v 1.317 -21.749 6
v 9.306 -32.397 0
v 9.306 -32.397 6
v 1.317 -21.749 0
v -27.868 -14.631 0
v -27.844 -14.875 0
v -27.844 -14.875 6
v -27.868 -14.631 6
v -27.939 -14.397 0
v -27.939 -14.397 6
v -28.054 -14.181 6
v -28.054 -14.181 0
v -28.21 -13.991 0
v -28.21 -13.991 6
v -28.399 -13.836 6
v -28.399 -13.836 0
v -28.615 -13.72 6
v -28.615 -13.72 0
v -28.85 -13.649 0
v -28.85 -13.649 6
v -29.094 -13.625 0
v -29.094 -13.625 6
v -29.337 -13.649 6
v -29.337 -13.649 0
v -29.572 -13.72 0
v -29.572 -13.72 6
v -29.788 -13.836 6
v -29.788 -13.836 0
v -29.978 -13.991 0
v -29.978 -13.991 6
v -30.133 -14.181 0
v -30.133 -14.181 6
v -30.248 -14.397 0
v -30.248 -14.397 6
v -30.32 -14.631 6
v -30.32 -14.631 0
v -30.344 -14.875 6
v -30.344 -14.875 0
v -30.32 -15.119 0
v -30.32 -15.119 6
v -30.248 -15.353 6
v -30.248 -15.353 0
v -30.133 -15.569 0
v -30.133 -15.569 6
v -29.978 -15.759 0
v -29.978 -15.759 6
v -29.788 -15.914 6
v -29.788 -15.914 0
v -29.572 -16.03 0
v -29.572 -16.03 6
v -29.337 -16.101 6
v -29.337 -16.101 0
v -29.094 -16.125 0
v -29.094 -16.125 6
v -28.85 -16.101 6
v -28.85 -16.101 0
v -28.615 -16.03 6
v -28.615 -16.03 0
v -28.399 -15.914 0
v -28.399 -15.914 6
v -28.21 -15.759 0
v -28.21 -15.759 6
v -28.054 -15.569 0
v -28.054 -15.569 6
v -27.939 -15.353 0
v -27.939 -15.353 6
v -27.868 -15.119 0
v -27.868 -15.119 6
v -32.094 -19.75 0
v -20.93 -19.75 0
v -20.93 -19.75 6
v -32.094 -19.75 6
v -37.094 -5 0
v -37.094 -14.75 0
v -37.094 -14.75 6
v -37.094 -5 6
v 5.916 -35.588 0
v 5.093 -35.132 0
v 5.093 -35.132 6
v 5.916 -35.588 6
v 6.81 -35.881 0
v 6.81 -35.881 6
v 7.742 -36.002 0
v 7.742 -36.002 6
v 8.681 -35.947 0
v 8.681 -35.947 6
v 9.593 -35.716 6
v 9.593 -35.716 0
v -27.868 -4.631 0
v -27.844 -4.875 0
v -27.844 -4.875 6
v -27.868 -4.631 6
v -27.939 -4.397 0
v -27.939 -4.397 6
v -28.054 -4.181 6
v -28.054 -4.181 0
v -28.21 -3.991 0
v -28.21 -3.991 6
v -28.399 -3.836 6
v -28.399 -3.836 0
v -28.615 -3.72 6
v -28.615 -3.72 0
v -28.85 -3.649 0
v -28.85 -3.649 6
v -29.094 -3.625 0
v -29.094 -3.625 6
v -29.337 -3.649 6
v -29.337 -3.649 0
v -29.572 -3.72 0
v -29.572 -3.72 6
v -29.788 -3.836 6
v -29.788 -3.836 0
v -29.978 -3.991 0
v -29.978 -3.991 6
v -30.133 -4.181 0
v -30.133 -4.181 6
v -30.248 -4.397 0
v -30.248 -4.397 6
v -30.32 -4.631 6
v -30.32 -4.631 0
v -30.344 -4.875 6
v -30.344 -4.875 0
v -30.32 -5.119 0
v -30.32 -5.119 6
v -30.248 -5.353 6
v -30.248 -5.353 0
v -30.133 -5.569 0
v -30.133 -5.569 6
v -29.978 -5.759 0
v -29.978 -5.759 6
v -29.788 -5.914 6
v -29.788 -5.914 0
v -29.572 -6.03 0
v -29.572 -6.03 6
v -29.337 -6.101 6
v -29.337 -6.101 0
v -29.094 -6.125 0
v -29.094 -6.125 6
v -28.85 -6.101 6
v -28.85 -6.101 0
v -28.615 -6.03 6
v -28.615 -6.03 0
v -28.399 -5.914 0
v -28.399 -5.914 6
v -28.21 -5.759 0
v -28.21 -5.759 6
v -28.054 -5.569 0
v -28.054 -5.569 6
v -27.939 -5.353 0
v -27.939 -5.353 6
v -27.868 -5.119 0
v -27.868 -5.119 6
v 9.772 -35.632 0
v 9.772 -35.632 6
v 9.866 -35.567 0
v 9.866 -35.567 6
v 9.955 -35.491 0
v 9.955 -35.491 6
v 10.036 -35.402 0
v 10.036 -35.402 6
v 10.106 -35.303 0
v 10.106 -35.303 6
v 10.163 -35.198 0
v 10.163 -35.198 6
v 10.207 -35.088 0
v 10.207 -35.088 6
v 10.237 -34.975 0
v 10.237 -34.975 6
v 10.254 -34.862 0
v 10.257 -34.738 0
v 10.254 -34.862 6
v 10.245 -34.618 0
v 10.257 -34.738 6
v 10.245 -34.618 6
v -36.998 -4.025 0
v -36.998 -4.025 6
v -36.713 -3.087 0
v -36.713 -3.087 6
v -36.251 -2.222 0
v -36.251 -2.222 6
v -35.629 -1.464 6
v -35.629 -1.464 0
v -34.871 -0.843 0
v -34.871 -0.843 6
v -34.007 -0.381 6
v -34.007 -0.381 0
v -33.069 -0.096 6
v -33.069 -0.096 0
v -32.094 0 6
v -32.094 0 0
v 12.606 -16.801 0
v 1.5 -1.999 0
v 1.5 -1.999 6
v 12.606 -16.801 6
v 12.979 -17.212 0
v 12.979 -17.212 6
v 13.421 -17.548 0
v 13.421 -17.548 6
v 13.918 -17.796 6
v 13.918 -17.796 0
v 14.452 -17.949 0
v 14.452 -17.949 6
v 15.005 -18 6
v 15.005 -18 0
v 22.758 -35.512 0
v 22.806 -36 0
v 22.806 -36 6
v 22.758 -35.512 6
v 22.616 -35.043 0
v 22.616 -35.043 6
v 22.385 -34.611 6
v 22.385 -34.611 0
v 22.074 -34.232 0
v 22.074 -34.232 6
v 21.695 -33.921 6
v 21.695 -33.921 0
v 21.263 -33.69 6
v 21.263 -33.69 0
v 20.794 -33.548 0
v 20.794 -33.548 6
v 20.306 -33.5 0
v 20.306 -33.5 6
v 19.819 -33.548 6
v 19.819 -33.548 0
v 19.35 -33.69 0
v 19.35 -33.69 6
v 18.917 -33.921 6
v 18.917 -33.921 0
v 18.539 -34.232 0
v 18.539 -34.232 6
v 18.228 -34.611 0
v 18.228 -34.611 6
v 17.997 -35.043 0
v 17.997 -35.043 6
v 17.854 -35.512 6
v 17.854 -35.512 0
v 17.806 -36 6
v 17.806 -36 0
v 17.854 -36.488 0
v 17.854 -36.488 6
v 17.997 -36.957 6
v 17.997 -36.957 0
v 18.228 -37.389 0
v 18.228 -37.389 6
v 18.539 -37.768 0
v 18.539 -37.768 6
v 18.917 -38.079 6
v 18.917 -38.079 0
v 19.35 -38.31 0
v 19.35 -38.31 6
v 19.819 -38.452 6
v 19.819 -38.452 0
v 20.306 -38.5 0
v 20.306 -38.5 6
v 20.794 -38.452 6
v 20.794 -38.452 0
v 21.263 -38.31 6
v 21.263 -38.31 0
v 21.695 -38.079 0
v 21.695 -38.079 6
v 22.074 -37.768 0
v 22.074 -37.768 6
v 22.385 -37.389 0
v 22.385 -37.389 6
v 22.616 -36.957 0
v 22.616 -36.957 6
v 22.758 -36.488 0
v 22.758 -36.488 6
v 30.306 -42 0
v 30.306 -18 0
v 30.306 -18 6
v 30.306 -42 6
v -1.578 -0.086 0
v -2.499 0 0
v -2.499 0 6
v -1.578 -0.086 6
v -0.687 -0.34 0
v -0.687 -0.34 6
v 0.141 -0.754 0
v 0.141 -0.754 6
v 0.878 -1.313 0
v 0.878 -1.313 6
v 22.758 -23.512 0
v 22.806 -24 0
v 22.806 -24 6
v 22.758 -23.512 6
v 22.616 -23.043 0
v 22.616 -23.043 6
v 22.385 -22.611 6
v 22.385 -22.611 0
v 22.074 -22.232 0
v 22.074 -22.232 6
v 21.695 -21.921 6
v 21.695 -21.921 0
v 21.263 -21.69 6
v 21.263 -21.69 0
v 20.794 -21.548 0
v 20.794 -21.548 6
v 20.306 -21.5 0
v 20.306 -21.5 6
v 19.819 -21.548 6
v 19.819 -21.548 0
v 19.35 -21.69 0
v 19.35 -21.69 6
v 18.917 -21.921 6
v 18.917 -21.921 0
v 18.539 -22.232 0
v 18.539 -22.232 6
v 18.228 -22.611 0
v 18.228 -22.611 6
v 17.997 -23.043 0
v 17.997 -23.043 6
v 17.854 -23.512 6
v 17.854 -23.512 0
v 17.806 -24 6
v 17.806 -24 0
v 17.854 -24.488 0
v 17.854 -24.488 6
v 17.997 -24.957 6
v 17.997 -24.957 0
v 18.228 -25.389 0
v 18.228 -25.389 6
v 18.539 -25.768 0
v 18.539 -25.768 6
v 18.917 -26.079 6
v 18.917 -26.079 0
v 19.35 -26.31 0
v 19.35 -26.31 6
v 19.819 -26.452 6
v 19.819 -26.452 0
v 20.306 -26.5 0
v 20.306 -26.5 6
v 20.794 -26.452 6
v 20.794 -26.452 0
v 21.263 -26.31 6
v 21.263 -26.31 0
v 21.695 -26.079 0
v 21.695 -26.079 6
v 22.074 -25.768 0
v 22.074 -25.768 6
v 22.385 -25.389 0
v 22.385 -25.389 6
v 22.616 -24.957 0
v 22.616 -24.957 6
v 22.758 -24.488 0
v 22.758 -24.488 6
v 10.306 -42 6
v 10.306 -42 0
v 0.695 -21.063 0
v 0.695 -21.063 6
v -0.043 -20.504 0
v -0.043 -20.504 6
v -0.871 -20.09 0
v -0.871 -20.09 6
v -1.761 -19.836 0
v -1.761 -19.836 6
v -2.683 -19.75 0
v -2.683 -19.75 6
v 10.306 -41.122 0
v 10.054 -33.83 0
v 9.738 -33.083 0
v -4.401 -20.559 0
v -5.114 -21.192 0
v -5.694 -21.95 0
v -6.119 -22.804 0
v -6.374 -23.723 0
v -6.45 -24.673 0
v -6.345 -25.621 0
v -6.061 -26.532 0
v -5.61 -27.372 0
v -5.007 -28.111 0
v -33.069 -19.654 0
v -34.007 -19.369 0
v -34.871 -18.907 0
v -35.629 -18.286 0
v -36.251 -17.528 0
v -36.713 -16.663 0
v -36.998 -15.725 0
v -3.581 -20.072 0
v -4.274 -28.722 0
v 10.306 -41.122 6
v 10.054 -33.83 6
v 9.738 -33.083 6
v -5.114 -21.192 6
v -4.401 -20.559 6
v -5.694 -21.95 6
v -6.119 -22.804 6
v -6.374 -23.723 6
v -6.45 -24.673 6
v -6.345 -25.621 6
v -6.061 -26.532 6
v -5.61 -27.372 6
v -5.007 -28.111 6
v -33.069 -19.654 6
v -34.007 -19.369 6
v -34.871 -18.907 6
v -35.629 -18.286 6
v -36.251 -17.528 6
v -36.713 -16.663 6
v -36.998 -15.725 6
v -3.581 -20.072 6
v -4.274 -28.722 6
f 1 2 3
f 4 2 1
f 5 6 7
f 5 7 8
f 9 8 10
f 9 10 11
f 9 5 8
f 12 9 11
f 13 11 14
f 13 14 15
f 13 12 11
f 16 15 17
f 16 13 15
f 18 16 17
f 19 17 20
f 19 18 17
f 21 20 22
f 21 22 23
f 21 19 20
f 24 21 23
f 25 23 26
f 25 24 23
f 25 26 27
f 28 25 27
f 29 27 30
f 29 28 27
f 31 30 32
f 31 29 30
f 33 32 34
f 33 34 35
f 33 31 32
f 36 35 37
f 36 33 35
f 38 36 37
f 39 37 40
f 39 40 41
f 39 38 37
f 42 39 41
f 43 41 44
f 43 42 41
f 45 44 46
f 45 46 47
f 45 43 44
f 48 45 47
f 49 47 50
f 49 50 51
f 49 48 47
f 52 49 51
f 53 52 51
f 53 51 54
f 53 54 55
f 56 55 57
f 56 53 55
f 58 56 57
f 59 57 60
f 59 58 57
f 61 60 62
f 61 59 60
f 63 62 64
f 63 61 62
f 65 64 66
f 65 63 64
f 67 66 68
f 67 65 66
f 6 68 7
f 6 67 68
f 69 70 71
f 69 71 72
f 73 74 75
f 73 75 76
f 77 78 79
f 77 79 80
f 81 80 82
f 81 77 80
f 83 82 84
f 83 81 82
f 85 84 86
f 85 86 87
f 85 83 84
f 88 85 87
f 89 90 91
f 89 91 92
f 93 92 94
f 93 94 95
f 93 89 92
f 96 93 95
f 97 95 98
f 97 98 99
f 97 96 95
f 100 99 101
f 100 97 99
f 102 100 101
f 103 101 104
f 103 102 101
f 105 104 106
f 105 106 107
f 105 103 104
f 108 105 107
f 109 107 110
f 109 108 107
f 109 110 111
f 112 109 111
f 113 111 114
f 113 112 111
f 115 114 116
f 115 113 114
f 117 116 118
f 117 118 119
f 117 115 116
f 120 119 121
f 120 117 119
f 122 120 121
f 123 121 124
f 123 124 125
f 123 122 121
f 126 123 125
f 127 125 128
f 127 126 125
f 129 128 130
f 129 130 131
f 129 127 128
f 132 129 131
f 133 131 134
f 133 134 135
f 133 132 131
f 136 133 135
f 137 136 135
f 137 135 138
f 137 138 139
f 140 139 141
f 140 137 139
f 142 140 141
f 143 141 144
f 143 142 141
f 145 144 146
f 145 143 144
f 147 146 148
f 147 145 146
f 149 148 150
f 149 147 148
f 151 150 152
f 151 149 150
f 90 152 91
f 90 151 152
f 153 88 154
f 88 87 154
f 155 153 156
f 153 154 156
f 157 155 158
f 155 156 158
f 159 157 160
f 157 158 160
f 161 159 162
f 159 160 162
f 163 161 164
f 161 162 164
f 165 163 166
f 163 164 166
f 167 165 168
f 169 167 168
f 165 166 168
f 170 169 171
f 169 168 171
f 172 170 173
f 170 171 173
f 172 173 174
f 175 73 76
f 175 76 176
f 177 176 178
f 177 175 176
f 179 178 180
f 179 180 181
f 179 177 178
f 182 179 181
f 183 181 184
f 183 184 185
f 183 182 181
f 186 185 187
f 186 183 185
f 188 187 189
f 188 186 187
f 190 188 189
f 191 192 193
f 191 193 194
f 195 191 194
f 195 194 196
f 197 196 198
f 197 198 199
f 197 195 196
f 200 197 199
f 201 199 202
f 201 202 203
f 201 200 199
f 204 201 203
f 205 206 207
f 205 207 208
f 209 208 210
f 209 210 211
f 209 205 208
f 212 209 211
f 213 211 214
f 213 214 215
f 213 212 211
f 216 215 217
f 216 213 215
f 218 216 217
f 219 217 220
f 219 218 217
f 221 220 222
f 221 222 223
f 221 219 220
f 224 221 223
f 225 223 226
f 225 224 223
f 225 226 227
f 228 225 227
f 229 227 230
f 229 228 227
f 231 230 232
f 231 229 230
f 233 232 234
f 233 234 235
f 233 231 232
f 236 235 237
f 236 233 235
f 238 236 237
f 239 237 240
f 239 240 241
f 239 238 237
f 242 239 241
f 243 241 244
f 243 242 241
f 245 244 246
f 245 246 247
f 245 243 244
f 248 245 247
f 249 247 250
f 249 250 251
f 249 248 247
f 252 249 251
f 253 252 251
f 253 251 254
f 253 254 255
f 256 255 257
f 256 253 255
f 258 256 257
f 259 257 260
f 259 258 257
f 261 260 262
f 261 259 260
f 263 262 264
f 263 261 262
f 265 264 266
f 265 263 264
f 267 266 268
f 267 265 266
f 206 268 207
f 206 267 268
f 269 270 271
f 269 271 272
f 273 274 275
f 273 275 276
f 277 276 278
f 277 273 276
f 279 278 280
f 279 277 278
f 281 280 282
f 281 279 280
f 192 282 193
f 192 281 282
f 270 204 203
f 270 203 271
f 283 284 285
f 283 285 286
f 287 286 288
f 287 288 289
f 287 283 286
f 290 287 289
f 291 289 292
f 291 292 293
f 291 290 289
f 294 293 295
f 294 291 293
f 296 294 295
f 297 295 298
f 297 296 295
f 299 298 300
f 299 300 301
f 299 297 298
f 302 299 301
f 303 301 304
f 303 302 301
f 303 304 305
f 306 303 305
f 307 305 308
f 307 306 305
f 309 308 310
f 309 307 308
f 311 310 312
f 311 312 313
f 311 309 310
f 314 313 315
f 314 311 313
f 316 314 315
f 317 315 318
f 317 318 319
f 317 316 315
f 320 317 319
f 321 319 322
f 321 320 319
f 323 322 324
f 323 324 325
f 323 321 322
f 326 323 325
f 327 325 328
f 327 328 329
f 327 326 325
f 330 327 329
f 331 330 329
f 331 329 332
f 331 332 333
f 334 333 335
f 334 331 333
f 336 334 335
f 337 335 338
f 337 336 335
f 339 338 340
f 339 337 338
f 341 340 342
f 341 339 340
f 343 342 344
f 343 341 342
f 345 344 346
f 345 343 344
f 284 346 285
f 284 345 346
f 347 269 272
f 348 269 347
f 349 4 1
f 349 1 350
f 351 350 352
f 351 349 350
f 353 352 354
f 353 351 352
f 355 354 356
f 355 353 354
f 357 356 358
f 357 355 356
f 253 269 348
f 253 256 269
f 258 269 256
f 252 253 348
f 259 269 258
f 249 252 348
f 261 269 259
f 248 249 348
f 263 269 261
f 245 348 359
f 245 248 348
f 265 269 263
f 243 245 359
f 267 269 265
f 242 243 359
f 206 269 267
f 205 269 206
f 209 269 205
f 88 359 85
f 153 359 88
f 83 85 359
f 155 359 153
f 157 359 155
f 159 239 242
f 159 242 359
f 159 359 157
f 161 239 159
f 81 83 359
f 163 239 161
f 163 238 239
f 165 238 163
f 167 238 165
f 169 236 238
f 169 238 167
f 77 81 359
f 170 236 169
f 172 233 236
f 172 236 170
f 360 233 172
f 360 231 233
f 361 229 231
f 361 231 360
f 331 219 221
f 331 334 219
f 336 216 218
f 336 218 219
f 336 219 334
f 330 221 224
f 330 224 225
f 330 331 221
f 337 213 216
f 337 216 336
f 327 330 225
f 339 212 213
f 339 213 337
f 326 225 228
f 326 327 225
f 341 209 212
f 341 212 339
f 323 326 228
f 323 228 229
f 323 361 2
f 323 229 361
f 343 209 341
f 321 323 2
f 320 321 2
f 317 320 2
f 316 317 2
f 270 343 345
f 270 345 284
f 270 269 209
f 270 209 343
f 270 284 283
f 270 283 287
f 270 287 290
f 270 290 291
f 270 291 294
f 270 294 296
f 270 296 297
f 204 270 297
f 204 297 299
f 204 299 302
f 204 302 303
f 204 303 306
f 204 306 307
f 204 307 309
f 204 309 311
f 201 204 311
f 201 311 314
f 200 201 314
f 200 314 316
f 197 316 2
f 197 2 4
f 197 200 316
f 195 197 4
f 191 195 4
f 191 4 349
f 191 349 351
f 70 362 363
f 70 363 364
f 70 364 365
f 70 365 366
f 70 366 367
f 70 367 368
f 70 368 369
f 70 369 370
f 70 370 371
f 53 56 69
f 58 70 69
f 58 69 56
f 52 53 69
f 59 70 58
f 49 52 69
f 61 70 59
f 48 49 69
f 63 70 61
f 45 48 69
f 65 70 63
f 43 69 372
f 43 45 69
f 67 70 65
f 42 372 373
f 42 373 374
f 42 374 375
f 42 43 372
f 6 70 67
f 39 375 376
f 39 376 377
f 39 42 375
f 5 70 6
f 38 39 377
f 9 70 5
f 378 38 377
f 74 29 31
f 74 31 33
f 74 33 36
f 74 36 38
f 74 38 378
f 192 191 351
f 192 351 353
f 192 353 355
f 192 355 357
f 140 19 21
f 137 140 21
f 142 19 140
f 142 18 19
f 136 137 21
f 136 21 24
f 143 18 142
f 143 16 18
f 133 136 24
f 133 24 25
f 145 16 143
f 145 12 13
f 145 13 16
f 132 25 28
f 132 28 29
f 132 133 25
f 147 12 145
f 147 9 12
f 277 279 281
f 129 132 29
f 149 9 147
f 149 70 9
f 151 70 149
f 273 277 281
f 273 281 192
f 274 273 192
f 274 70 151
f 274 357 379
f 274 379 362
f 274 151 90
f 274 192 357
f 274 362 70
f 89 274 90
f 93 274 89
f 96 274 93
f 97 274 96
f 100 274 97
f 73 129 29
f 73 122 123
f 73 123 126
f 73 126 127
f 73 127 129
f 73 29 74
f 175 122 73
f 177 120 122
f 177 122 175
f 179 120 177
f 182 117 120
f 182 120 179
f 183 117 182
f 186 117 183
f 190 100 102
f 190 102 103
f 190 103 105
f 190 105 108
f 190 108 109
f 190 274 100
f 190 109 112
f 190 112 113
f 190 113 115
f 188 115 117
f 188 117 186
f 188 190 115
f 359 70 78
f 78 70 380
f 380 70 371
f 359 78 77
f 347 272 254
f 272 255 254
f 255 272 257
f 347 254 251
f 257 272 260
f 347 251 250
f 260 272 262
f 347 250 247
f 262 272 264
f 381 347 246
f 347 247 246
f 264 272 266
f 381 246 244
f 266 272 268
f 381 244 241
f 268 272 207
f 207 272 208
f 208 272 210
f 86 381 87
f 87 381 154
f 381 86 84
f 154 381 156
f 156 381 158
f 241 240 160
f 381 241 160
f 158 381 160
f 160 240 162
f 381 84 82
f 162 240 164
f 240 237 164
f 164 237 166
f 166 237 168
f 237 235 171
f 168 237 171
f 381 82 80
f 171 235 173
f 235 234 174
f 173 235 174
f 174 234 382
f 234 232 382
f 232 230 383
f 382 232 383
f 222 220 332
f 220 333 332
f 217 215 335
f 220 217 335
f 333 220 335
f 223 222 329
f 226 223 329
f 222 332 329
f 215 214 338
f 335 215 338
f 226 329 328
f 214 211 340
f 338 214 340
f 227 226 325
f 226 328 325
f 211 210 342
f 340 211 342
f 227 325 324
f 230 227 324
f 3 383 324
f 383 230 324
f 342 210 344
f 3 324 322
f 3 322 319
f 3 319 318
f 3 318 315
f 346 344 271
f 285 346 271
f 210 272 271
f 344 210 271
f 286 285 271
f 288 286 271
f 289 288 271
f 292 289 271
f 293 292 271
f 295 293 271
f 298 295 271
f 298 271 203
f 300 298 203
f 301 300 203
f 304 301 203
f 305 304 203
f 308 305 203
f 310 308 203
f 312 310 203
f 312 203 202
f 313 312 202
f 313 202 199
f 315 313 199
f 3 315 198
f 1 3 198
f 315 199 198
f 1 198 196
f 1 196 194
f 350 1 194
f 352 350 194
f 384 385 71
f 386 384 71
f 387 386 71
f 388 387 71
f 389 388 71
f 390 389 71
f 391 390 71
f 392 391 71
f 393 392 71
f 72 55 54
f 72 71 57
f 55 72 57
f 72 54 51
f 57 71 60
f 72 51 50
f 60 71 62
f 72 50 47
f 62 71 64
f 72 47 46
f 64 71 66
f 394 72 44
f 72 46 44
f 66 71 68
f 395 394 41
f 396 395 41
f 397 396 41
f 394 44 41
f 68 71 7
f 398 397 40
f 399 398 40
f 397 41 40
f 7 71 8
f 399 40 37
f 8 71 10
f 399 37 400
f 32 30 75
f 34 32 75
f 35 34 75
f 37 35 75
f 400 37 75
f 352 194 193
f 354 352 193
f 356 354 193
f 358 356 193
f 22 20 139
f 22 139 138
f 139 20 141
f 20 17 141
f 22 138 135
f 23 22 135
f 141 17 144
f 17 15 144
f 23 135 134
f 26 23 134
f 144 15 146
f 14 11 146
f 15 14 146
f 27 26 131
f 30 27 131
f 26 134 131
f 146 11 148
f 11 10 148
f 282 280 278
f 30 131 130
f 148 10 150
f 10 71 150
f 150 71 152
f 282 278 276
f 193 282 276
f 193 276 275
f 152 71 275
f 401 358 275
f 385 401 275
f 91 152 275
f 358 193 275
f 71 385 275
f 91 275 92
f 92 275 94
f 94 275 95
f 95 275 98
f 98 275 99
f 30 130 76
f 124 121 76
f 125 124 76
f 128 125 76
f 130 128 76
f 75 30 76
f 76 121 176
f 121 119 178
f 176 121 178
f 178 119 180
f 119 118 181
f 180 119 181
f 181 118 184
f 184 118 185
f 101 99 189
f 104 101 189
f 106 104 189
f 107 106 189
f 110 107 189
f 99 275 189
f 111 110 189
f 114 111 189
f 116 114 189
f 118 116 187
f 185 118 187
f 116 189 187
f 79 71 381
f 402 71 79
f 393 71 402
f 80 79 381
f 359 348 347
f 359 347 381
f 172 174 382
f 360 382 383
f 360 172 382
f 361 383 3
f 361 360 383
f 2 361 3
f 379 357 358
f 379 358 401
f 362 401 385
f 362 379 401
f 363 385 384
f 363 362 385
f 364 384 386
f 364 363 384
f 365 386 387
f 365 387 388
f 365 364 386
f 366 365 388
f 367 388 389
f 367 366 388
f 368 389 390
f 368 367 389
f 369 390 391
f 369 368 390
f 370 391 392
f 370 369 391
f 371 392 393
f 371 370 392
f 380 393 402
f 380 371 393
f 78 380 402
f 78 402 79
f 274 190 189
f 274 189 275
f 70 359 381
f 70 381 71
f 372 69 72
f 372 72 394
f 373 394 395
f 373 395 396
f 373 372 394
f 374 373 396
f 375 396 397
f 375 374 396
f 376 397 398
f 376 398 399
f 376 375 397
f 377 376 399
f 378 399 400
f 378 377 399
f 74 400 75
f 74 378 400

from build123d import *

# Parameters (mm, degrees)
SKETCH_1_R      = 2.5
SKETCH_1_R_2    = 1.25
EXTRUDE_1_DEPTH = 6
FILLET_1_R      = 5
FILLET_2_R      = 1


with BuildPart() as part:
    # 草图1 → 凸台-拉伸1 (new body)
    with BuildSketch(Plane.XY):
        with BuildLine():
            Line((1.500025947, -1.999165895), (12.605850611, -16.800500463))
            ThreePointArc((12.605850611, -16.800500463), (13.664114192, -17.683421453), (15.005475182, -18))
            Line((15.005475182, -18), (30.306366751, -18))
            Line((30.306366751, -18), (30.306366751, -32.6148543))
            Line((30.306366751, -32.6148543), (30.306366751, -42))
            Line((30.306366751, -42), (10.306366751, -42))
            Line((10.306366751, -42), (10.306366751, -41.12210437))
            Line((10.306366751, -41.12210437), (-20.930018343, -19.75))
            Line((-20.930018343, -19.75), (-32.093633249, -19.75))
            ThreePointArc((-32.093633249, -19.75), (-35.629167155, -18.285533906), (-37.093633249, -14.75))
            Line((-37.093633249, -14.75), (-37.093633249, -5))
            ThreePointArc((-37.093633249, -5), (-35.629167155, -1.464466094), (-32.093633249, 0))
            Line((-32.093633249, 0), (-2.499348338, 0))
            ThreePointArc((-2.499348338, 0), (-0.263746688, -0.527630912), (1.500025947, -1.999165895))
        make_face()
        with Locations((20.306366751, -36)):
            Circle(SKETCH_1_R, mode=Mode.SUBTRACT)
        with Locations((20.306366751, -24)):
            Circle(SKETCH_1_R, mode=Mode.SUBTRACT)
        with Locations((-29.093633249, -4.875)):
            Circle(SKETCH_1_R_2, mode=Mode.SUBTRACT)
        with Locations((-29.093633249, -14.875)):
            Circle(SKETCH_1_R_2, mode=Mode.SUBTRACT)
        with BuildLine():
            Line((9.305741036, -32.39670638), (1.316615651, -21.749165895))
            ThreePointArc((1.316615651, -21.749165895), (-0.447156984, -20.277630912), (-2.682758634, -19.75))
            Line((-2.682758634, -19.75), (-17.388195941, -19.75))
            Line((-17.388195941, -19.75), (10.306366751, -38.698770243))
            Line((10.306366751, -38.698770243), (10.306366751, -35.397540485))
            ThreePointArc((10.306366751, -35.397540485), (10.049618348, -33.815907061), (9.305741036, -32.39670638))
        make_face(mode=Mode.SUBTRACT)
    extrude(amount=EXTRUDE_1_DEPTH)

    # 圆角1
    # the kernel refuses this fillet: 5 mm, written as the material it adds along each edge
    with BuildSketch(Plane(origin=(10.306366751, -38.698770243, 0), x_dir=(0, 1, 0), z_dir=(0, 0, 1))) as fillet_1_piece_1:
        with BuildLine():
            CenterArc((7.693275838, 2.389546239), FILLET_1_R, 145.619854071, 62.929086432)
            Line((3.566729735, 5.2129515), (3.484198813, 5.269419605))
            Line((3.484198813, 5.269419605), (-0.082530922, 0.056468105))
            Line((-0.082530922, 0.056468105), (0, -0.1))
            ThreePointArc((0, -0.1), (1.650614879, -0.1), (3.213388836, -0.047790925))
            Line((3.213388836, -0.047790925), (3.301229757, 0))
        make_face()
    extrude(amount=6)
    with BuildSketch(Plane(origin=(-17.388195941, -19.75, 0), x_dir=(0.8253092204879542, -0.5646810520794596, 0), z_dir=(0, 0, 1))) as fillet_1_piece_2:
        with BuildLine():
            CenterArc((15.8894472, 5), FILLET_1_R, 138.640890522, 131.359109478)
            Line((12.136533001, 8.30388181), (12.061474717, 8.369959446))
            ThreePointArc((12.061474717, 8.369959446), (6.011798395, 4.234471827), (-0.056468105, 0.082530922))
            Line((-0.056468105, 0.082530922), (0, -0.1))
            Line((0, -0.1), (15.8894472, -0.1))
            Line((15.8894472, -0.1), (15.8894472, 0))
        make_face()
    extrude(amount=6)

    # 圆角2
    fillet_2_edges = [part.edges().sort_by_distance(p)[0] for p in [
        (10.306366751, -35.397540485, 3),
    ]]
    fillet(fillet_2_edges, radius=FILLET_2_R)


solid = part.part
